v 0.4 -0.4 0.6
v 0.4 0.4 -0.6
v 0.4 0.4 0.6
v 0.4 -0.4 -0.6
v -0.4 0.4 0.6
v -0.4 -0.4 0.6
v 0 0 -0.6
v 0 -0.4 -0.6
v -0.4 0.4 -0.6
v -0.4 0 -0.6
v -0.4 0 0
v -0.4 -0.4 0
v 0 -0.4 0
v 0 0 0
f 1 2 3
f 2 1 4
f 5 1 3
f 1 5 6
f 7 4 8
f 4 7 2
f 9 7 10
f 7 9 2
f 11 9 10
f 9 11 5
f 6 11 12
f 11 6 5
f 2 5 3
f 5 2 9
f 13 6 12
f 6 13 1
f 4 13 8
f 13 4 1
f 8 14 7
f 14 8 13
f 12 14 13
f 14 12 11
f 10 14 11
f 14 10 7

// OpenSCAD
module beveled_cuboid() {
    difference() {
        cube([0.8, 0.8, 1.2], center=true);
        translate([-0.4, -0.4, -0.6])
            cube([0.8, 0.8, 1.2], center=true);
    }
}

beveled_cuboid();
